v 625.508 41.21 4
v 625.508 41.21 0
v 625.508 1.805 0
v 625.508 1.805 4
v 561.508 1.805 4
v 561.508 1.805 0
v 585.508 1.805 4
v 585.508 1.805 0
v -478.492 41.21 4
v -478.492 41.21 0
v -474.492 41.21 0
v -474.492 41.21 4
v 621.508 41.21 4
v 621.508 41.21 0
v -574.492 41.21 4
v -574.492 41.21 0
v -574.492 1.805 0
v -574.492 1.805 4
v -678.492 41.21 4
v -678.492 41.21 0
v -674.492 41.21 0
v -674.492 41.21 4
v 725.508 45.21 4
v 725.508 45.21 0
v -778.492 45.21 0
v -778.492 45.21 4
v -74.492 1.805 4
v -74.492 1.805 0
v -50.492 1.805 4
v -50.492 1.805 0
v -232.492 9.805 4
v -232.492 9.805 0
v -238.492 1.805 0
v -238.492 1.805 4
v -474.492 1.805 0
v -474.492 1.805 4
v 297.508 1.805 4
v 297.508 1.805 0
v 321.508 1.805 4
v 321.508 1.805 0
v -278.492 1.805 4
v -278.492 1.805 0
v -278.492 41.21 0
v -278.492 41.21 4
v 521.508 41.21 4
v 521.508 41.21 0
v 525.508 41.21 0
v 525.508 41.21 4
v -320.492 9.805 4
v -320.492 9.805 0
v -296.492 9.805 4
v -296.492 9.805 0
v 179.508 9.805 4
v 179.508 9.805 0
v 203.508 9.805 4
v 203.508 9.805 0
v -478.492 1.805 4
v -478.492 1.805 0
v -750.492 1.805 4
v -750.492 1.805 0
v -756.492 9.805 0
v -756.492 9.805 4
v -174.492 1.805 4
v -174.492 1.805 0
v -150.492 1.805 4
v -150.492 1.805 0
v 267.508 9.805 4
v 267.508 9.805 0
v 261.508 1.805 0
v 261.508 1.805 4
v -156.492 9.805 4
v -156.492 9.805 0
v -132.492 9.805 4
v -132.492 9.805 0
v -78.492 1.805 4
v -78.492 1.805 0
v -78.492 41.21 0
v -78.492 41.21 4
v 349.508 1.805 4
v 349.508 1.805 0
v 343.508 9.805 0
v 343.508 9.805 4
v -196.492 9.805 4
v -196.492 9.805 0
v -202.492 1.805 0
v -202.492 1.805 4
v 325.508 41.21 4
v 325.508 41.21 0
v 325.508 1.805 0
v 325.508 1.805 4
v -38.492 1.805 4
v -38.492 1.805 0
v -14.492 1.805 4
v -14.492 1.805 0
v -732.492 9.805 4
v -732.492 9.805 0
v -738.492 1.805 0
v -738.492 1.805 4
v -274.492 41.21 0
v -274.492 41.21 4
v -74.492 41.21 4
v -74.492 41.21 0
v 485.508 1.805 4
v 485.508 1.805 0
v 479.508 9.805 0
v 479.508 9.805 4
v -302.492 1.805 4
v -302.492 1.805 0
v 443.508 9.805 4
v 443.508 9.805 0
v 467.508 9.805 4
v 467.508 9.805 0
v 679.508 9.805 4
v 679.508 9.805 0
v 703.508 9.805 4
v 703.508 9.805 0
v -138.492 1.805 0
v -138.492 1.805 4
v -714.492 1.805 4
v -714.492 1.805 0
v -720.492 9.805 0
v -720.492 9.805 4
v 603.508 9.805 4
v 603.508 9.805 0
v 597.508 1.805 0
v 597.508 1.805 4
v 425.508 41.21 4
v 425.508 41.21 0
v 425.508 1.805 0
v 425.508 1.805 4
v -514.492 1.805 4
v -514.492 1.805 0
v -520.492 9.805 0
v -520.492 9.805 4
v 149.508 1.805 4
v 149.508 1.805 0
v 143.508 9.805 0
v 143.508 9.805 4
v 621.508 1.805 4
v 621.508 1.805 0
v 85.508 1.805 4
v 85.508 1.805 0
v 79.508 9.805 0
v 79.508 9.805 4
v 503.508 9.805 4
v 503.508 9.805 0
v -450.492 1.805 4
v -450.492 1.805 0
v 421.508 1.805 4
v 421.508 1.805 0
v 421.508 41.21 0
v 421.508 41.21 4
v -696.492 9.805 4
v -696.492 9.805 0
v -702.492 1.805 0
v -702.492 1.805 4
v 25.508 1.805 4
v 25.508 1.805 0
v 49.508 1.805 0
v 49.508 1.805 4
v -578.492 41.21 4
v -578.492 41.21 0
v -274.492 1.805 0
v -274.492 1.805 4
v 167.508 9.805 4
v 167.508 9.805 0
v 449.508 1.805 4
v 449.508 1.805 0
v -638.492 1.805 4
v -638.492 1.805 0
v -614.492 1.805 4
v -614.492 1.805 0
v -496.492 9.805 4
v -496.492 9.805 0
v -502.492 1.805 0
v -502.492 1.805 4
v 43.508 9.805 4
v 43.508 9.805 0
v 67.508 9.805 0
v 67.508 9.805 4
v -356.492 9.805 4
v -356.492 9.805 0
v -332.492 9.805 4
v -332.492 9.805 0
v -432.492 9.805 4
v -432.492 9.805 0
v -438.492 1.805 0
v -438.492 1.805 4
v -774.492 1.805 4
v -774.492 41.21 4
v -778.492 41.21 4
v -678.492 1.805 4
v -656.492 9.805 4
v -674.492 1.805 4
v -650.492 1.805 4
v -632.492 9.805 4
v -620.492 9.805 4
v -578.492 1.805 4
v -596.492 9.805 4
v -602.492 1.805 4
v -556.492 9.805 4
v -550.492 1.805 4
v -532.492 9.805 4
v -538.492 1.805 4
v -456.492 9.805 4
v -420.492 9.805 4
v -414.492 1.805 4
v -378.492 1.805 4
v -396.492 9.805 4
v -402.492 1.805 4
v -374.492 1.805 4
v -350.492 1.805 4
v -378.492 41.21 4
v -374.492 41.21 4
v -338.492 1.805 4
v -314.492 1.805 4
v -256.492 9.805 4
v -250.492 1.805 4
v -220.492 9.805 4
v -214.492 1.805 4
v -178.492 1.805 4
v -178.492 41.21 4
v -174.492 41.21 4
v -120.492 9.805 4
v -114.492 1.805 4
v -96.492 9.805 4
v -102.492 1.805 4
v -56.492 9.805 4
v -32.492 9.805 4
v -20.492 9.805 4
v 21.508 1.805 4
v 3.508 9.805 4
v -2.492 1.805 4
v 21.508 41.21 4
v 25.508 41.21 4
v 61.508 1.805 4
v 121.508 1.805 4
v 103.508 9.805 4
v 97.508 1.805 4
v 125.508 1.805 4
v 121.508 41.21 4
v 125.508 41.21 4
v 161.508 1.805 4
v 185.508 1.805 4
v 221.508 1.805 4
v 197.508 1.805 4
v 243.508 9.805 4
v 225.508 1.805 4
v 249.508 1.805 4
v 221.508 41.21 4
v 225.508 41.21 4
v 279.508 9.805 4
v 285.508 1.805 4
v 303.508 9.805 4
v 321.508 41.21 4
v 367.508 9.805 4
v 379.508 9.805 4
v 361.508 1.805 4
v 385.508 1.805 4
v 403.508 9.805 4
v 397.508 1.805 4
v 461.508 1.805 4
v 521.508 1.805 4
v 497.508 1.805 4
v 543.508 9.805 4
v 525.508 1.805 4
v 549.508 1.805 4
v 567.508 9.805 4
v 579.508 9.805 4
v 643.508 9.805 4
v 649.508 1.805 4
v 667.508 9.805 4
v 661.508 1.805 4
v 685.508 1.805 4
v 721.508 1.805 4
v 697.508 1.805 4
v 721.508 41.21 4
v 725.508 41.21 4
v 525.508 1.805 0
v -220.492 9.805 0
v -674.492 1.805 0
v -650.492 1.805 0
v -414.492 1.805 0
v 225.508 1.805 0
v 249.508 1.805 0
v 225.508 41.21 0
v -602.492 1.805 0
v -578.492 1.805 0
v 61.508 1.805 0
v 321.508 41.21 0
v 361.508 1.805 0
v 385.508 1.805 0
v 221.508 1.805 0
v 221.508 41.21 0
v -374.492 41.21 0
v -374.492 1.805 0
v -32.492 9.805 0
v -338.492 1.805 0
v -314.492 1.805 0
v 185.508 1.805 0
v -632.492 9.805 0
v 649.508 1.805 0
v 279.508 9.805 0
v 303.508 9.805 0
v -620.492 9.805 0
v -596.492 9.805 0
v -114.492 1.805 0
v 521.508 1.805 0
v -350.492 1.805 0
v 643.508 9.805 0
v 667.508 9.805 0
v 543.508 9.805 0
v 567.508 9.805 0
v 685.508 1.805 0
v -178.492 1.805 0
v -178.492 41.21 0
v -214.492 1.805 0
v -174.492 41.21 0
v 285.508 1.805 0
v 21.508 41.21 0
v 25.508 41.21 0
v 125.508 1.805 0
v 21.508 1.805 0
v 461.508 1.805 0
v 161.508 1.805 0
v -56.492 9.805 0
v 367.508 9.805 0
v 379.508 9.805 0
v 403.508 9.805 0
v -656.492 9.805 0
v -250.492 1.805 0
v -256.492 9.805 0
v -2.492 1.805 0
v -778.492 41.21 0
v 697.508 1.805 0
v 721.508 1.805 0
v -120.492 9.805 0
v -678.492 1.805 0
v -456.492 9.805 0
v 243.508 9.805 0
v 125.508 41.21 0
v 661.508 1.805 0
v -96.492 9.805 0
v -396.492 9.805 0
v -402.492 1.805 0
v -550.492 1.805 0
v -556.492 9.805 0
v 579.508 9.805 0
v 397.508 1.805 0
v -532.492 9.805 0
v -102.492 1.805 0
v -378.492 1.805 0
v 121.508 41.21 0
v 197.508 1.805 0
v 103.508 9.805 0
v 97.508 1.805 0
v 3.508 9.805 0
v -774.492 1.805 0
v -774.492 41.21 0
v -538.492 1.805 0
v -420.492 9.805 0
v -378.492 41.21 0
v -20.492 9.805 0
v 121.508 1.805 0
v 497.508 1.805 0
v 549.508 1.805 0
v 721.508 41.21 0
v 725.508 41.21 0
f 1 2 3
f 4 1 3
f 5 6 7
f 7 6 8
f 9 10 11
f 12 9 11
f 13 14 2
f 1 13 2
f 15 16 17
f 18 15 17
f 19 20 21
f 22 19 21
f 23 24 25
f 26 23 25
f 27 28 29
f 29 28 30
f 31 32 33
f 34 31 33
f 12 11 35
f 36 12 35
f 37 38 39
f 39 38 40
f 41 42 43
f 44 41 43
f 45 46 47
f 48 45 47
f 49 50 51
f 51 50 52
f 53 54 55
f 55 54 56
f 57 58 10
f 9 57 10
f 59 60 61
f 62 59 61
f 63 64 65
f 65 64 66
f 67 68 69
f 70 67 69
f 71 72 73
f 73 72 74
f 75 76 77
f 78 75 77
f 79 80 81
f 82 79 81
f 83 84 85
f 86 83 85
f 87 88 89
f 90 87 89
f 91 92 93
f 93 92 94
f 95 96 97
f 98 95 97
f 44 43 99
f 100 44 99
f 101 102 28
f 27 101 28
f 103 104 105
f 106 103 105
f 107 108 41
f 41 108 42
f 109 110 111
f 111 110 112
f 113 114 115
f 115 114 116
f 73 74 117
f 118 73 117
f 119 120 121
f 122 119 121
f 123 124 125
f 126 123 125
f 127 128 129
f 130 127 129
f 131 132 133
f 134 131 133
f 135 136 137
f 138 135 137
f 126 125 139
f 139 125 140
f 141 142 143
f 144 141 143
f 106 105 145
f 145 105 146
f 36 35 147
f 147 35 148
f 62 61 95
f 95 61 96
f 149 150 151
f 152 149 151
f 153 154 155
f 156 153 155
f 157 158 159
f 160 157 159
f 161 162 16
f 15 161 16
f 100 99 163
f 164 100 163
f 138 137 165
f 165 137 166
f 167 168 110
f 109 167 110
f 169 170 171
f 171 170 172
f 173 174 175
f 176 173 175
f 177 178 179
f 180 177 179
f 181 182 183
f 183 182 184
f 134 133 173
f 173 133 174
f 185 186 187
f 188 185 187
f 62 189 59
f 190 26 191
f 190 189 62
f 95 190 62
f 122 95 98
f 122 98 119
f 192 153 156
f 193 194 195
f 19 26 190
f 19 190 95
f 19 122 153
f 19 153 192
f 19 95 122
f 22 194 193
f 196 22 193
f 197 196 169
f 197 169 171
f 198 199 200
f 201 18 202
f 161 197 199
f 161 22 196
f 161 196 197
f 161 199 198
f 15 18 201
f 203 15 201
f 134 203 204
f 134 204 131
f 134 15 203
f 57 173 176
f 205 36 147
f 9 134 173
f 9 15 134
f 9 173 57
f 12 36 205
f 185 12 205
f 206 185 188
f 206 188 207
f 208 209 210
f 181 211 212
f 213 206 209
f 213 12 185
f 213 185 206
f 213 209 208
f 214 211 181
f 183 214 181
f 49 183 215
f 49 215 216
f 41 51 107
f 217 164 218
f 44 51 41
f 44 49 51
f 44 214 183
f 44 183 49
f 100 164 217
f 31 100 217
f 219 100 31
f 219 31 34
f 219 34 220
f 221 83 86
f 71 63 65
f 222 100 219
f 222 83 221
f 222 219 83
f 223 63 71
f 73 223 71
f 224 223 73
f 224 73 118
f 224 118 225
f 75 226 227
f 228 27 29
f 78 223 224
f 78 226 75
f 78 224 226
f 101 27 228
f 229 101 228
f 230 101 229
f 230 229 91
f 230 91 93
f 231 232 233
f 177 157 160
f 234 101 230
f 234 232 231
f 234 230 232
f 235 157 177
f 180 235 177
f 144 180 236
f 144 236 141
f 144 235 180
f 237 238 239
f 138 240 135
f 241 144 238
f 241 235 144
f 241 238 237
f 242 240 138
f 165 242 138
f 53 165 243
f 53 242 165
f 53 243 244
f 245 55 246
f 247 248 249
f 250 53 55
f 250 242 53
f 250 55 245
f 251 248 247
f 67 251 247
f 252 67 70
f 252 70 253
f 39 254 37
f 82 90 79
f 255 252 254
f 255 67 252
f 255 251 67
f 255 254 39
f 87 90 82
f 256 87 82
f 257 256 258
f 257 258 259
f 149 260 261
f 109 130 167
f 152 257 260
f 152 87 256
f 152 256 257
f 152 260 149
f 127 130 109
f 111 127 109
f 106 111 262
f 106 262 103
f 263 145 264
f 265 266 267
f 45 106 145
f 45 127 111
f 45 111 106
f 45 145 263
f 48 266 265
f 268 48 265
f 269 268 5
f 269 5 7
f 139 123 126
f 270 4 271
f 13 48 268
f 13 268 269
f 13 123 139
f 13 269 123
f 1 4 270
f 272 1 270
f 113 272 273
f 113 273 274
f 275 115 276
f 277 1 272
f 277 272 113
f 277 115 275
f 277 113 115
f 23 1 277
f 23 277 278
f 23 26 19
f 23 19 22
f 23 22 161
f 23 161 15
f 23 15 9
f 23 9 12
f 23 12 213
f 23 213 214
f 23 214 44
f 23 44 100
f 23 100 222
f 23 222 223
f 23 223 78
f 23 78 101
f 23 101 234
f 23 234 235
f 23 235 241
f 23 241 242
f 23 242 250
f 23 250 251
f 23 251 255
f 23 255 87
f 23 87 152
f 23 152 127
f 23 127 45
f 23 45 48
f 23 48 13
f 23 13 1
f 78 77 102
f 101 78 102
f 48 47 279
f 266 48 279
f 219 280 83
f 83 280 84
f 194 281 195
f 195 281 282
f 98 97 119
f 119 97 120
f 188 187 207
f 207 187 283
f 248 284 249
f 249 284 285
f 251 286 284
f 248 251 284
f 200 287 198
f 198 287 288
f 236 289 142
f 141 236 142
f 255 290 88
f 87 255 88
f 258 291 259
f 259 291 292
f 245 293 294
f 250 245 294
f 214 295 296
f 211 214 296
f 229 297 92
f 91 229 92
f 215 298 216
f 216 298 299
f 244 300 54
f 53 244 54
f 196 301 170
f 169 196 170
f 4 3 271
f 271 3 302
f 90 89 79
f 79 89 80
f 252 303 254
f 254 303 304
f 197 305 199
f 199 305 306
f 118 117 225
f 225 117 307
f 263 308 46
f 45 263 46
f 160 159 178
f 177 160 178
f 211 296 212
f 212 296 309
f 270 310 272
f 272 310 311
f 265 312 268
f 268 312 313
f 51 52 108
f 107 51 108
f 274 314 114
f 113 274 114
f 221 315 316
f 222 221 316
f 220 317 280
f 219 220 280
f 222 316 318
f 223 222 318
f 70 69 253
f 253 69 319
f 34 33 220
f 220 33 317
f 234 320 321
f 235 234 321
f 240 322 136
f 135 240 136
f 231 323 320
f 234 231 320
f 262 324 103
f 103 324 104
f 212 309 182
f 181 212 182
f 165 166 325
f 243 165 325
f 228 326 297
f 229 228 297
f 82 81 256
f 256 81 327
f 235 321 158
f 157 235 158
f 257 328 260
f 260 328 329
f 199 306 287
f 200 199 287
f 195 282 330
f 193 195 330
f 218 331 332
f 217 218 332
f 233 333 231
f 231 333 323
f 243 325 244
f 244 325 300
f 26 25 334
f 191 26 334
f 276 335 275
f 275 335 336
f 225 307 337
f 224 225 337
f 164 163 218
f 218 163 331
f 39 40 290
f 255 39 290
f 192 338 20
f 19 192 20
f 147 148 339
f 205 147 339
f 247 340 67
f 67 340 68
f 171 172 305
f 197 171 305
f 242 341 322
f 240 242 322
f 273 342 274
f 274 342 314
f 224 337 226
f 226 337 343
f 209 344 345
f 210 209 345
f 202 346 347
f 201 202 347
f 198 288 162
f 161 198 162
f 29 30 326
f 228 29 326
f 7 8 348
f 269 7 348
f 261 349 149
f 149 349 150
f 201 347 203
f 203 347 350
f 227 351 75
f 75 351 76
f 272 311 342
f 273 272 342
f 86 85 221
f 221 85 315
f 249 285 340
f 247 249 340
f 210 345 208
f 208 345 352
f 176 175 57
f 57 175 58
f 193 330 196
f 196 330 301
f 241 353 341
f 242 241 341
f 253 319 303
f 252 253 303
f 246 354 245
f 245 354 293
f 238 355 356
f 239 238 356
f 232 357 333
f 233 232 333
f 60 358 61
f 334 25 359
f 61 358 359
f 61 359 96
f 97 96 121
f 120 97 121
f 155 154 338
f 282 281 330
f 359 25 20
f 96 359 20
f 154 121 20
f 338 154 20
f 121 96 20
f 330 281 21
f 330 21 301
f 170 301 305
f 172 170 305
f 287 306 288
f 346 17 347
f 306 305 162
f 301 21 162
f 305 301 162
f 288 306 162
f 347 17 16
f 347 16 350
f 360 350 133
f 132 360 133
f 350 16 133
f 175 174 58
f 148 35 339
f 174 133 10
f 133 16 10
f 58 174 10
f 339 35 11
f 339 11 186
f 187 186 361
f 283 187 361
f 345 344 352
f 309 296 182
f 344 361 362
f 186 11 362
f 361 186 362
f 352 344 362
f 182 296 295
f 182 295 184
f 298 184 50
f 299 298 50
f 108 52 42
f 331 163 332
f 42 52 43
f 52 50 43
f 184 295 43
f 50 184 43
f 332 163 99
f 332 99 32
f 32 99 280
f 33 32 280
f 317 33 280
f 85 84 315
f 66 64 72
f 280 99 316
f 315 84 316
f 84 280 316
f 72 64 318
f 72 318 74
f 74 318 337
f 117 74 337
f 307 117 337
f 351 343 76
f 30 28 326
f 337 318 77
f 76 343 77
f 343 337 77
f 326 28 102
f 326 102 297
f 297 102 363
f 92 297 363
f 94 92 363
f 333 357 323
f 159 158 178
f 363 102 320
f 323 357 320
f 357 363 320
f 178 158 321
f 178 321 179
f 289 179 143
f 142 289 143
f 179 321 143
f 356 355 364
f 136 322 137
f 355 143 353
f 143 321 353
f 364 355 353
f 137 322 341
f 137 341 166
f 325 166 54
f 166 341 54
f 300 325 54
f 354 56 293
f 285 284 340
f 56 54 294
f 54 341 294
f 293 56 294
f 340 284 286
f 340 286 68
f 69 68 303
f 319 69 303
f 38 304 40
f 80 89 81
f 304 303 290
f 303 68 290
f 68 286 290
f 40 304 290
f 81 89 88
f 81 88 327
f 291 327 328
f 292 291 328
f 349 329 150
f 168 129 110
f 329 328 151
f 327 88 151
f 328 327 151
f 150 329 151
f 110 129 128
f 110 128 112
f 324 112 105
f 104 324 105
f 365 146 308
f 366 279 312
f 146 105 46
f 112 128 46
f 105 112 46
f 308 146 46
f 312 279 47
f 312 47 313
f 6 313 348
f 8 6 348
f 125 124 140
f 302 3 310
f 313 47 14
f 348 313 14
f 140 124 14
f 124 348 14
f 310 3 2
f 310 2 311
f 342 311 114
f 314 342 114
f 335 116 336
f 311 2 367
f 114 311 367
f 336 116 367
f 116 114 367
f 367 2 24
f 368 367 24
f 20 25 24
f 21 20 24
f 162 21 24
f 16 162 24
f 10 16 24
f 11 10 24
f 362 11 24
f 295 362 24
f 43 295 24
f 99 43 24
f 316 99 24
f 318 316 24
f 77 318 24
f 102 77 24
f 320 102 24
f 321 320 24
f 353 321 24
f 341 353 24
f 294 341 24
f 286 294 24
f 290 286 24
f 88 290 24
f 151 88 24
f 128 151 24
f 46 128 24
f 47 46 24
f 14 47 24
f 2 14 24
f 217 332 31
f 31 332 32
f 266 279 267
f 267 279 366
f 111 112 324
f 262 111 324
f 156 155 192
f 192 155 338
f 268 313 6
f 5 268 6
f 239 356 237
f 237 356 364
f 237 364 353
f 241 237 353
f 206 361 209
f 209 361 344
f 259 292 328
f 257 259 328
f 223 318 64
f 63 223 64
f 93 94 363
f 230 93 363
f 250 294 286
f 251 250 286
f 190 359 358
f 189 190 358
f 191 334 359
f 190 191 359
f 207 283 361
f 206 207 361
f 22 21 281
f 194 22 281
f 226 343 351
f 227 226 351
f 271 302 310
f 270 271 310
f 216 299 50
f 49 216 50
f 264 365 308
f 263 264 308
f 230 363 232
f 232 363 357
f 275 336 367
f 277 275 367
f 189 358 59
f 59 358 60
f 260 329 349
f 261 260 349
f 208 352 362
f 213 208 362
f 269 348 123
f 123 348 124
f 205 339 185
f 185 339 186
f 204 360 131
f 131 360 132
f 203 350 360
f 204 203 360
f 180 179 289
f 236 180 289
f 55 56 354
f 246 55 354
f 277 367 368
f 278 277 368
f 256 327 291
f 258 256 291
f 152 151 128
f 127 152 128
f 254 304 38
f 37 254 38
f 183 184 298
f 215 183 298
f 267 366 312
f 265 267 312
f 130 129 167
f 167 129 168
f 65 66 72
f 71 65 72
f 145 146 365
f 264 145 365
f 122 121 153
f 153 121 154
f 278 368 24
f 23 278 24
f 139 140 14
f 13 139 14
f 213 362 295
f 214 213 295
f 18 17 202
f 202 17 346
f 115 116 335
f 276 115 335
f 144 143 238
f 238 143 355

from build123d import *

# Parameters (mm, degrees)
BOSS_EXTRUDE1_DEPTH = 4


with BuildPart() as part:
    # Sketch2 → Boss-Extrude1 (new body)
    with BuildSketch(Plane.XY):
        Polygon((-778.491602678, 45.210025961), (-778.491602678, 41.210025961), (-774.491602678, 41.210025961), (-774.491602678, 1.805025961), (-750.491602678, 1.805025961), (-756.491602678, 9.805025961), (-732.491602678, 9.805025961), (-738.491602678, 1.805025961), (-714.491602678, 1.805025961), (-720.491602678, 9.805025961), (-696.491602678, 9.805025961), (-702.491602678, 1.805025961), (-678.491602678, 1.805025961), (-678.491602678, 41.210025961), (-674.491602678, 41.210025961), (-674.491602678, 1.805025961), (-650.491602678, 1.805025961), (-656.491602678, 9.805025961), (-632.491602678, 9.805025961), (-638.491602678, 1.805025961), (-614.491602678, 1.805025961), (-620.491602678, 9.805025961), (-596.491602678, 9.805025961), (-602.491602678, 1.805025961), (-578.491602678, 1.805025961), (-578.491602678, 41.210025961), (-574.491602678, 41.210025961), (-574.491602678, 1.805025961), (-550.491602678, 1.805025961), (-556.491602678, 9.805025961), (-532.491602678, 9.805025961), (-538.491602678, 1.805025961), (-514.491602678, 1.805025961), (-520.491602678, 9.805025961), (-496.491602678, 9.805025961), (-502.491602678, 1.805025961), (-478.491602678, 1.805025961), (-478.491602678, 41.210025961), (-474.491602678, 41.210025961), (-474.491602678, 1.805025961), (-450.491602678, 1.805025961), (-456.491602678, 9.805025961), (-432.491602678, 9.805025961), (-438.491602678, 1.805025961), (-414.491602678, 1.805025961), (-420.491602678, 9.805025961), (-396.491602678, 9.805025961), (-402.491602678, 1.805025961), (-378.491602678, 1.805025961), (-378.491602678, 41.210025961), (-374.491602678, 41.210025961), (-374.491602678, 1.805025961), (-350.491602678, 1.805025961), (-356.491602678, 9.805025961), (-332.491602678, 9.805025961), (-338.491602678, 1.805025961), (-314.491602678, 1.805025961), (-320.491602678, 9.805025961), (-296.491602678, 9.805025961), (-302.491602678, 1.805025961), (-278.491602678, 1.805025961), (-278.491602678, 41.210025961), (-274.491602678, 41.210025961), (-274.491602678, 1.805025961), (-250.491602678, 1.805025961), (-256.491602678, 9.805025961), (-232.491602678, 9.805025961), (-238.491602678, 1.805025961), (-214.491602678, 1.805025961), (-220.491602678, 9.805025961), (-196.491602678, 9.805025961), (-202.491602678, 1.805025961), (-178.491602678, 1.805025961), (-178.491602678, 41.210025961), (-174.491602678, 41.210025961), (-174.491602678, 1.805025961), (-150.491602678, 1.805025961), (-156.491602678, 9.805025961), (-132.491602678, 9.805025961), (-138.491602678, 1.805025961), (-114.491602678, 1.805025961), (-120.491602678, 9.805025961), (-96.491602678, 9.805025961), (-102.491602678, 1.805025961), (-78.491602678, 1.805025961), (-78.491602678, 41.210025961), (-74.491602678, 41.210025961), (-74.491602678, 1.805025961), (-50.491602678, 1.805025961), (-56.491602678, 9.805025961), (-32.491602678, 9.805025961), (-38.491602678, 1.805025961), (-14.491602678, 1.805025961), (-20.491602678, 9.805025961), (3.508397322, 9.805025961), (-2.491602678, 1.805025961), (21.508397322, 1.805025961), (21.508397322, 41.210025961), (25.508397322, 41.210025961), (25.508397322, 1.805025961), (49.508397322, 1.805025961), (43.508397322, 9.805025961), (67.508397322, 9.805025961), (61.508397322, 1.805025961), (85.508397322, 1.805025961), (79.508397322, 9.805025961), (103.508397322, 9.805025961), (97.508397322, 1.805025961), (121.508397322, 1.805025961), (121.508397322, 41.210025961), (125.508397322, 41.210025961), (125.508397322, 1.805025961), (149.508397322, 1.805025961), (143.508397322, 9.805025961), (167.508397322, 9.805025961), (161.508397322, 1.805025961), (185.508397322, 1.805025961), (179.508397322, 9.805025961), (203.508397322, 9.805025961), (197.508397322, 1.805025961), (221.508397322, 1.805025961), (221.508397322, 41.210025961), (225.508397322, 41.210025961), (225.508397322, 1.805025961), (249.508397322, 1.805025961), (243.508397322, 9.805025961), (267.508397322, 9.805025961), (261.508397322, 1.805025961), (285.508397322, 1.805025961), (279.508397322, 9.805025961), (303.508397322, 9.805025961), (297.508397322, 1.805025961), (321.508397322, 1.805025961), (321.508397322, 41.210025961), (325.508397322, 41.210025961), (325.508397322, 1.805025961), (349.508397322, 1.805025961), (343.508397322, 9.805025961), (367.508397322, 9.805025961), (361.508397322, 1.805025961), (385.508397322, 1.805025961), (379.508397322, 9.805025961), (403.508397322, 9.805025961), (397.508397322, 1.805025961), (421.508397322, 1.805025961), (421.508397322, 41.210025961), (425.508397322, 41.210025961), (425.508397322, 1.805025961), (449.508397322, 1.805025961), (443.508397322, 9.805025961), (467.508397322, 9.805025961), (461.508397322, 1.805025961), (485.508397322, 1.805025961), (479.508397322, 9.805025961), (503.508397322, 9.805025961), (497.508397322, 1.805025961), (521.508397322, 1.805025961), (521.508397322, 41.210025961), (525.508397322, 41.210025961), (525.508397322, 1.805025961), (549.508397322, 1.805025961), (543.508397322, 9.805025961), (567.508397322, 9.805025961), (561.508397322, 1.805025961), (585.508397322, 1.805025961), (579.508397322, 9.805025961), (603.508397322, 9.805025961), (597.508397322, 1.805025961), (621.508397322, 1.805025961), (621.508397322, 41.210025961), (625.508397322, 41.210025961), (625.508397322, 1.805025961), (649.508397322, 1.805025961), (643.508397322, 9.805025961), (667.508397322, 9.805025961), (661.508397322, 1.805025961), (685.508397322, 1.805025961), (679.508397322, 9.805025961), (703.508397322, 9.805025961), (697.508397322, 1.805025961), (721.508397322, 1.805025961), (721.508397322, 41.210025961), (725.508397322, 41.210025961), (725.508397322, 45.210025961), align=None)
    extrude(amount=BOSS_EXTRUDE1_DEPTH)


solid = part.part
